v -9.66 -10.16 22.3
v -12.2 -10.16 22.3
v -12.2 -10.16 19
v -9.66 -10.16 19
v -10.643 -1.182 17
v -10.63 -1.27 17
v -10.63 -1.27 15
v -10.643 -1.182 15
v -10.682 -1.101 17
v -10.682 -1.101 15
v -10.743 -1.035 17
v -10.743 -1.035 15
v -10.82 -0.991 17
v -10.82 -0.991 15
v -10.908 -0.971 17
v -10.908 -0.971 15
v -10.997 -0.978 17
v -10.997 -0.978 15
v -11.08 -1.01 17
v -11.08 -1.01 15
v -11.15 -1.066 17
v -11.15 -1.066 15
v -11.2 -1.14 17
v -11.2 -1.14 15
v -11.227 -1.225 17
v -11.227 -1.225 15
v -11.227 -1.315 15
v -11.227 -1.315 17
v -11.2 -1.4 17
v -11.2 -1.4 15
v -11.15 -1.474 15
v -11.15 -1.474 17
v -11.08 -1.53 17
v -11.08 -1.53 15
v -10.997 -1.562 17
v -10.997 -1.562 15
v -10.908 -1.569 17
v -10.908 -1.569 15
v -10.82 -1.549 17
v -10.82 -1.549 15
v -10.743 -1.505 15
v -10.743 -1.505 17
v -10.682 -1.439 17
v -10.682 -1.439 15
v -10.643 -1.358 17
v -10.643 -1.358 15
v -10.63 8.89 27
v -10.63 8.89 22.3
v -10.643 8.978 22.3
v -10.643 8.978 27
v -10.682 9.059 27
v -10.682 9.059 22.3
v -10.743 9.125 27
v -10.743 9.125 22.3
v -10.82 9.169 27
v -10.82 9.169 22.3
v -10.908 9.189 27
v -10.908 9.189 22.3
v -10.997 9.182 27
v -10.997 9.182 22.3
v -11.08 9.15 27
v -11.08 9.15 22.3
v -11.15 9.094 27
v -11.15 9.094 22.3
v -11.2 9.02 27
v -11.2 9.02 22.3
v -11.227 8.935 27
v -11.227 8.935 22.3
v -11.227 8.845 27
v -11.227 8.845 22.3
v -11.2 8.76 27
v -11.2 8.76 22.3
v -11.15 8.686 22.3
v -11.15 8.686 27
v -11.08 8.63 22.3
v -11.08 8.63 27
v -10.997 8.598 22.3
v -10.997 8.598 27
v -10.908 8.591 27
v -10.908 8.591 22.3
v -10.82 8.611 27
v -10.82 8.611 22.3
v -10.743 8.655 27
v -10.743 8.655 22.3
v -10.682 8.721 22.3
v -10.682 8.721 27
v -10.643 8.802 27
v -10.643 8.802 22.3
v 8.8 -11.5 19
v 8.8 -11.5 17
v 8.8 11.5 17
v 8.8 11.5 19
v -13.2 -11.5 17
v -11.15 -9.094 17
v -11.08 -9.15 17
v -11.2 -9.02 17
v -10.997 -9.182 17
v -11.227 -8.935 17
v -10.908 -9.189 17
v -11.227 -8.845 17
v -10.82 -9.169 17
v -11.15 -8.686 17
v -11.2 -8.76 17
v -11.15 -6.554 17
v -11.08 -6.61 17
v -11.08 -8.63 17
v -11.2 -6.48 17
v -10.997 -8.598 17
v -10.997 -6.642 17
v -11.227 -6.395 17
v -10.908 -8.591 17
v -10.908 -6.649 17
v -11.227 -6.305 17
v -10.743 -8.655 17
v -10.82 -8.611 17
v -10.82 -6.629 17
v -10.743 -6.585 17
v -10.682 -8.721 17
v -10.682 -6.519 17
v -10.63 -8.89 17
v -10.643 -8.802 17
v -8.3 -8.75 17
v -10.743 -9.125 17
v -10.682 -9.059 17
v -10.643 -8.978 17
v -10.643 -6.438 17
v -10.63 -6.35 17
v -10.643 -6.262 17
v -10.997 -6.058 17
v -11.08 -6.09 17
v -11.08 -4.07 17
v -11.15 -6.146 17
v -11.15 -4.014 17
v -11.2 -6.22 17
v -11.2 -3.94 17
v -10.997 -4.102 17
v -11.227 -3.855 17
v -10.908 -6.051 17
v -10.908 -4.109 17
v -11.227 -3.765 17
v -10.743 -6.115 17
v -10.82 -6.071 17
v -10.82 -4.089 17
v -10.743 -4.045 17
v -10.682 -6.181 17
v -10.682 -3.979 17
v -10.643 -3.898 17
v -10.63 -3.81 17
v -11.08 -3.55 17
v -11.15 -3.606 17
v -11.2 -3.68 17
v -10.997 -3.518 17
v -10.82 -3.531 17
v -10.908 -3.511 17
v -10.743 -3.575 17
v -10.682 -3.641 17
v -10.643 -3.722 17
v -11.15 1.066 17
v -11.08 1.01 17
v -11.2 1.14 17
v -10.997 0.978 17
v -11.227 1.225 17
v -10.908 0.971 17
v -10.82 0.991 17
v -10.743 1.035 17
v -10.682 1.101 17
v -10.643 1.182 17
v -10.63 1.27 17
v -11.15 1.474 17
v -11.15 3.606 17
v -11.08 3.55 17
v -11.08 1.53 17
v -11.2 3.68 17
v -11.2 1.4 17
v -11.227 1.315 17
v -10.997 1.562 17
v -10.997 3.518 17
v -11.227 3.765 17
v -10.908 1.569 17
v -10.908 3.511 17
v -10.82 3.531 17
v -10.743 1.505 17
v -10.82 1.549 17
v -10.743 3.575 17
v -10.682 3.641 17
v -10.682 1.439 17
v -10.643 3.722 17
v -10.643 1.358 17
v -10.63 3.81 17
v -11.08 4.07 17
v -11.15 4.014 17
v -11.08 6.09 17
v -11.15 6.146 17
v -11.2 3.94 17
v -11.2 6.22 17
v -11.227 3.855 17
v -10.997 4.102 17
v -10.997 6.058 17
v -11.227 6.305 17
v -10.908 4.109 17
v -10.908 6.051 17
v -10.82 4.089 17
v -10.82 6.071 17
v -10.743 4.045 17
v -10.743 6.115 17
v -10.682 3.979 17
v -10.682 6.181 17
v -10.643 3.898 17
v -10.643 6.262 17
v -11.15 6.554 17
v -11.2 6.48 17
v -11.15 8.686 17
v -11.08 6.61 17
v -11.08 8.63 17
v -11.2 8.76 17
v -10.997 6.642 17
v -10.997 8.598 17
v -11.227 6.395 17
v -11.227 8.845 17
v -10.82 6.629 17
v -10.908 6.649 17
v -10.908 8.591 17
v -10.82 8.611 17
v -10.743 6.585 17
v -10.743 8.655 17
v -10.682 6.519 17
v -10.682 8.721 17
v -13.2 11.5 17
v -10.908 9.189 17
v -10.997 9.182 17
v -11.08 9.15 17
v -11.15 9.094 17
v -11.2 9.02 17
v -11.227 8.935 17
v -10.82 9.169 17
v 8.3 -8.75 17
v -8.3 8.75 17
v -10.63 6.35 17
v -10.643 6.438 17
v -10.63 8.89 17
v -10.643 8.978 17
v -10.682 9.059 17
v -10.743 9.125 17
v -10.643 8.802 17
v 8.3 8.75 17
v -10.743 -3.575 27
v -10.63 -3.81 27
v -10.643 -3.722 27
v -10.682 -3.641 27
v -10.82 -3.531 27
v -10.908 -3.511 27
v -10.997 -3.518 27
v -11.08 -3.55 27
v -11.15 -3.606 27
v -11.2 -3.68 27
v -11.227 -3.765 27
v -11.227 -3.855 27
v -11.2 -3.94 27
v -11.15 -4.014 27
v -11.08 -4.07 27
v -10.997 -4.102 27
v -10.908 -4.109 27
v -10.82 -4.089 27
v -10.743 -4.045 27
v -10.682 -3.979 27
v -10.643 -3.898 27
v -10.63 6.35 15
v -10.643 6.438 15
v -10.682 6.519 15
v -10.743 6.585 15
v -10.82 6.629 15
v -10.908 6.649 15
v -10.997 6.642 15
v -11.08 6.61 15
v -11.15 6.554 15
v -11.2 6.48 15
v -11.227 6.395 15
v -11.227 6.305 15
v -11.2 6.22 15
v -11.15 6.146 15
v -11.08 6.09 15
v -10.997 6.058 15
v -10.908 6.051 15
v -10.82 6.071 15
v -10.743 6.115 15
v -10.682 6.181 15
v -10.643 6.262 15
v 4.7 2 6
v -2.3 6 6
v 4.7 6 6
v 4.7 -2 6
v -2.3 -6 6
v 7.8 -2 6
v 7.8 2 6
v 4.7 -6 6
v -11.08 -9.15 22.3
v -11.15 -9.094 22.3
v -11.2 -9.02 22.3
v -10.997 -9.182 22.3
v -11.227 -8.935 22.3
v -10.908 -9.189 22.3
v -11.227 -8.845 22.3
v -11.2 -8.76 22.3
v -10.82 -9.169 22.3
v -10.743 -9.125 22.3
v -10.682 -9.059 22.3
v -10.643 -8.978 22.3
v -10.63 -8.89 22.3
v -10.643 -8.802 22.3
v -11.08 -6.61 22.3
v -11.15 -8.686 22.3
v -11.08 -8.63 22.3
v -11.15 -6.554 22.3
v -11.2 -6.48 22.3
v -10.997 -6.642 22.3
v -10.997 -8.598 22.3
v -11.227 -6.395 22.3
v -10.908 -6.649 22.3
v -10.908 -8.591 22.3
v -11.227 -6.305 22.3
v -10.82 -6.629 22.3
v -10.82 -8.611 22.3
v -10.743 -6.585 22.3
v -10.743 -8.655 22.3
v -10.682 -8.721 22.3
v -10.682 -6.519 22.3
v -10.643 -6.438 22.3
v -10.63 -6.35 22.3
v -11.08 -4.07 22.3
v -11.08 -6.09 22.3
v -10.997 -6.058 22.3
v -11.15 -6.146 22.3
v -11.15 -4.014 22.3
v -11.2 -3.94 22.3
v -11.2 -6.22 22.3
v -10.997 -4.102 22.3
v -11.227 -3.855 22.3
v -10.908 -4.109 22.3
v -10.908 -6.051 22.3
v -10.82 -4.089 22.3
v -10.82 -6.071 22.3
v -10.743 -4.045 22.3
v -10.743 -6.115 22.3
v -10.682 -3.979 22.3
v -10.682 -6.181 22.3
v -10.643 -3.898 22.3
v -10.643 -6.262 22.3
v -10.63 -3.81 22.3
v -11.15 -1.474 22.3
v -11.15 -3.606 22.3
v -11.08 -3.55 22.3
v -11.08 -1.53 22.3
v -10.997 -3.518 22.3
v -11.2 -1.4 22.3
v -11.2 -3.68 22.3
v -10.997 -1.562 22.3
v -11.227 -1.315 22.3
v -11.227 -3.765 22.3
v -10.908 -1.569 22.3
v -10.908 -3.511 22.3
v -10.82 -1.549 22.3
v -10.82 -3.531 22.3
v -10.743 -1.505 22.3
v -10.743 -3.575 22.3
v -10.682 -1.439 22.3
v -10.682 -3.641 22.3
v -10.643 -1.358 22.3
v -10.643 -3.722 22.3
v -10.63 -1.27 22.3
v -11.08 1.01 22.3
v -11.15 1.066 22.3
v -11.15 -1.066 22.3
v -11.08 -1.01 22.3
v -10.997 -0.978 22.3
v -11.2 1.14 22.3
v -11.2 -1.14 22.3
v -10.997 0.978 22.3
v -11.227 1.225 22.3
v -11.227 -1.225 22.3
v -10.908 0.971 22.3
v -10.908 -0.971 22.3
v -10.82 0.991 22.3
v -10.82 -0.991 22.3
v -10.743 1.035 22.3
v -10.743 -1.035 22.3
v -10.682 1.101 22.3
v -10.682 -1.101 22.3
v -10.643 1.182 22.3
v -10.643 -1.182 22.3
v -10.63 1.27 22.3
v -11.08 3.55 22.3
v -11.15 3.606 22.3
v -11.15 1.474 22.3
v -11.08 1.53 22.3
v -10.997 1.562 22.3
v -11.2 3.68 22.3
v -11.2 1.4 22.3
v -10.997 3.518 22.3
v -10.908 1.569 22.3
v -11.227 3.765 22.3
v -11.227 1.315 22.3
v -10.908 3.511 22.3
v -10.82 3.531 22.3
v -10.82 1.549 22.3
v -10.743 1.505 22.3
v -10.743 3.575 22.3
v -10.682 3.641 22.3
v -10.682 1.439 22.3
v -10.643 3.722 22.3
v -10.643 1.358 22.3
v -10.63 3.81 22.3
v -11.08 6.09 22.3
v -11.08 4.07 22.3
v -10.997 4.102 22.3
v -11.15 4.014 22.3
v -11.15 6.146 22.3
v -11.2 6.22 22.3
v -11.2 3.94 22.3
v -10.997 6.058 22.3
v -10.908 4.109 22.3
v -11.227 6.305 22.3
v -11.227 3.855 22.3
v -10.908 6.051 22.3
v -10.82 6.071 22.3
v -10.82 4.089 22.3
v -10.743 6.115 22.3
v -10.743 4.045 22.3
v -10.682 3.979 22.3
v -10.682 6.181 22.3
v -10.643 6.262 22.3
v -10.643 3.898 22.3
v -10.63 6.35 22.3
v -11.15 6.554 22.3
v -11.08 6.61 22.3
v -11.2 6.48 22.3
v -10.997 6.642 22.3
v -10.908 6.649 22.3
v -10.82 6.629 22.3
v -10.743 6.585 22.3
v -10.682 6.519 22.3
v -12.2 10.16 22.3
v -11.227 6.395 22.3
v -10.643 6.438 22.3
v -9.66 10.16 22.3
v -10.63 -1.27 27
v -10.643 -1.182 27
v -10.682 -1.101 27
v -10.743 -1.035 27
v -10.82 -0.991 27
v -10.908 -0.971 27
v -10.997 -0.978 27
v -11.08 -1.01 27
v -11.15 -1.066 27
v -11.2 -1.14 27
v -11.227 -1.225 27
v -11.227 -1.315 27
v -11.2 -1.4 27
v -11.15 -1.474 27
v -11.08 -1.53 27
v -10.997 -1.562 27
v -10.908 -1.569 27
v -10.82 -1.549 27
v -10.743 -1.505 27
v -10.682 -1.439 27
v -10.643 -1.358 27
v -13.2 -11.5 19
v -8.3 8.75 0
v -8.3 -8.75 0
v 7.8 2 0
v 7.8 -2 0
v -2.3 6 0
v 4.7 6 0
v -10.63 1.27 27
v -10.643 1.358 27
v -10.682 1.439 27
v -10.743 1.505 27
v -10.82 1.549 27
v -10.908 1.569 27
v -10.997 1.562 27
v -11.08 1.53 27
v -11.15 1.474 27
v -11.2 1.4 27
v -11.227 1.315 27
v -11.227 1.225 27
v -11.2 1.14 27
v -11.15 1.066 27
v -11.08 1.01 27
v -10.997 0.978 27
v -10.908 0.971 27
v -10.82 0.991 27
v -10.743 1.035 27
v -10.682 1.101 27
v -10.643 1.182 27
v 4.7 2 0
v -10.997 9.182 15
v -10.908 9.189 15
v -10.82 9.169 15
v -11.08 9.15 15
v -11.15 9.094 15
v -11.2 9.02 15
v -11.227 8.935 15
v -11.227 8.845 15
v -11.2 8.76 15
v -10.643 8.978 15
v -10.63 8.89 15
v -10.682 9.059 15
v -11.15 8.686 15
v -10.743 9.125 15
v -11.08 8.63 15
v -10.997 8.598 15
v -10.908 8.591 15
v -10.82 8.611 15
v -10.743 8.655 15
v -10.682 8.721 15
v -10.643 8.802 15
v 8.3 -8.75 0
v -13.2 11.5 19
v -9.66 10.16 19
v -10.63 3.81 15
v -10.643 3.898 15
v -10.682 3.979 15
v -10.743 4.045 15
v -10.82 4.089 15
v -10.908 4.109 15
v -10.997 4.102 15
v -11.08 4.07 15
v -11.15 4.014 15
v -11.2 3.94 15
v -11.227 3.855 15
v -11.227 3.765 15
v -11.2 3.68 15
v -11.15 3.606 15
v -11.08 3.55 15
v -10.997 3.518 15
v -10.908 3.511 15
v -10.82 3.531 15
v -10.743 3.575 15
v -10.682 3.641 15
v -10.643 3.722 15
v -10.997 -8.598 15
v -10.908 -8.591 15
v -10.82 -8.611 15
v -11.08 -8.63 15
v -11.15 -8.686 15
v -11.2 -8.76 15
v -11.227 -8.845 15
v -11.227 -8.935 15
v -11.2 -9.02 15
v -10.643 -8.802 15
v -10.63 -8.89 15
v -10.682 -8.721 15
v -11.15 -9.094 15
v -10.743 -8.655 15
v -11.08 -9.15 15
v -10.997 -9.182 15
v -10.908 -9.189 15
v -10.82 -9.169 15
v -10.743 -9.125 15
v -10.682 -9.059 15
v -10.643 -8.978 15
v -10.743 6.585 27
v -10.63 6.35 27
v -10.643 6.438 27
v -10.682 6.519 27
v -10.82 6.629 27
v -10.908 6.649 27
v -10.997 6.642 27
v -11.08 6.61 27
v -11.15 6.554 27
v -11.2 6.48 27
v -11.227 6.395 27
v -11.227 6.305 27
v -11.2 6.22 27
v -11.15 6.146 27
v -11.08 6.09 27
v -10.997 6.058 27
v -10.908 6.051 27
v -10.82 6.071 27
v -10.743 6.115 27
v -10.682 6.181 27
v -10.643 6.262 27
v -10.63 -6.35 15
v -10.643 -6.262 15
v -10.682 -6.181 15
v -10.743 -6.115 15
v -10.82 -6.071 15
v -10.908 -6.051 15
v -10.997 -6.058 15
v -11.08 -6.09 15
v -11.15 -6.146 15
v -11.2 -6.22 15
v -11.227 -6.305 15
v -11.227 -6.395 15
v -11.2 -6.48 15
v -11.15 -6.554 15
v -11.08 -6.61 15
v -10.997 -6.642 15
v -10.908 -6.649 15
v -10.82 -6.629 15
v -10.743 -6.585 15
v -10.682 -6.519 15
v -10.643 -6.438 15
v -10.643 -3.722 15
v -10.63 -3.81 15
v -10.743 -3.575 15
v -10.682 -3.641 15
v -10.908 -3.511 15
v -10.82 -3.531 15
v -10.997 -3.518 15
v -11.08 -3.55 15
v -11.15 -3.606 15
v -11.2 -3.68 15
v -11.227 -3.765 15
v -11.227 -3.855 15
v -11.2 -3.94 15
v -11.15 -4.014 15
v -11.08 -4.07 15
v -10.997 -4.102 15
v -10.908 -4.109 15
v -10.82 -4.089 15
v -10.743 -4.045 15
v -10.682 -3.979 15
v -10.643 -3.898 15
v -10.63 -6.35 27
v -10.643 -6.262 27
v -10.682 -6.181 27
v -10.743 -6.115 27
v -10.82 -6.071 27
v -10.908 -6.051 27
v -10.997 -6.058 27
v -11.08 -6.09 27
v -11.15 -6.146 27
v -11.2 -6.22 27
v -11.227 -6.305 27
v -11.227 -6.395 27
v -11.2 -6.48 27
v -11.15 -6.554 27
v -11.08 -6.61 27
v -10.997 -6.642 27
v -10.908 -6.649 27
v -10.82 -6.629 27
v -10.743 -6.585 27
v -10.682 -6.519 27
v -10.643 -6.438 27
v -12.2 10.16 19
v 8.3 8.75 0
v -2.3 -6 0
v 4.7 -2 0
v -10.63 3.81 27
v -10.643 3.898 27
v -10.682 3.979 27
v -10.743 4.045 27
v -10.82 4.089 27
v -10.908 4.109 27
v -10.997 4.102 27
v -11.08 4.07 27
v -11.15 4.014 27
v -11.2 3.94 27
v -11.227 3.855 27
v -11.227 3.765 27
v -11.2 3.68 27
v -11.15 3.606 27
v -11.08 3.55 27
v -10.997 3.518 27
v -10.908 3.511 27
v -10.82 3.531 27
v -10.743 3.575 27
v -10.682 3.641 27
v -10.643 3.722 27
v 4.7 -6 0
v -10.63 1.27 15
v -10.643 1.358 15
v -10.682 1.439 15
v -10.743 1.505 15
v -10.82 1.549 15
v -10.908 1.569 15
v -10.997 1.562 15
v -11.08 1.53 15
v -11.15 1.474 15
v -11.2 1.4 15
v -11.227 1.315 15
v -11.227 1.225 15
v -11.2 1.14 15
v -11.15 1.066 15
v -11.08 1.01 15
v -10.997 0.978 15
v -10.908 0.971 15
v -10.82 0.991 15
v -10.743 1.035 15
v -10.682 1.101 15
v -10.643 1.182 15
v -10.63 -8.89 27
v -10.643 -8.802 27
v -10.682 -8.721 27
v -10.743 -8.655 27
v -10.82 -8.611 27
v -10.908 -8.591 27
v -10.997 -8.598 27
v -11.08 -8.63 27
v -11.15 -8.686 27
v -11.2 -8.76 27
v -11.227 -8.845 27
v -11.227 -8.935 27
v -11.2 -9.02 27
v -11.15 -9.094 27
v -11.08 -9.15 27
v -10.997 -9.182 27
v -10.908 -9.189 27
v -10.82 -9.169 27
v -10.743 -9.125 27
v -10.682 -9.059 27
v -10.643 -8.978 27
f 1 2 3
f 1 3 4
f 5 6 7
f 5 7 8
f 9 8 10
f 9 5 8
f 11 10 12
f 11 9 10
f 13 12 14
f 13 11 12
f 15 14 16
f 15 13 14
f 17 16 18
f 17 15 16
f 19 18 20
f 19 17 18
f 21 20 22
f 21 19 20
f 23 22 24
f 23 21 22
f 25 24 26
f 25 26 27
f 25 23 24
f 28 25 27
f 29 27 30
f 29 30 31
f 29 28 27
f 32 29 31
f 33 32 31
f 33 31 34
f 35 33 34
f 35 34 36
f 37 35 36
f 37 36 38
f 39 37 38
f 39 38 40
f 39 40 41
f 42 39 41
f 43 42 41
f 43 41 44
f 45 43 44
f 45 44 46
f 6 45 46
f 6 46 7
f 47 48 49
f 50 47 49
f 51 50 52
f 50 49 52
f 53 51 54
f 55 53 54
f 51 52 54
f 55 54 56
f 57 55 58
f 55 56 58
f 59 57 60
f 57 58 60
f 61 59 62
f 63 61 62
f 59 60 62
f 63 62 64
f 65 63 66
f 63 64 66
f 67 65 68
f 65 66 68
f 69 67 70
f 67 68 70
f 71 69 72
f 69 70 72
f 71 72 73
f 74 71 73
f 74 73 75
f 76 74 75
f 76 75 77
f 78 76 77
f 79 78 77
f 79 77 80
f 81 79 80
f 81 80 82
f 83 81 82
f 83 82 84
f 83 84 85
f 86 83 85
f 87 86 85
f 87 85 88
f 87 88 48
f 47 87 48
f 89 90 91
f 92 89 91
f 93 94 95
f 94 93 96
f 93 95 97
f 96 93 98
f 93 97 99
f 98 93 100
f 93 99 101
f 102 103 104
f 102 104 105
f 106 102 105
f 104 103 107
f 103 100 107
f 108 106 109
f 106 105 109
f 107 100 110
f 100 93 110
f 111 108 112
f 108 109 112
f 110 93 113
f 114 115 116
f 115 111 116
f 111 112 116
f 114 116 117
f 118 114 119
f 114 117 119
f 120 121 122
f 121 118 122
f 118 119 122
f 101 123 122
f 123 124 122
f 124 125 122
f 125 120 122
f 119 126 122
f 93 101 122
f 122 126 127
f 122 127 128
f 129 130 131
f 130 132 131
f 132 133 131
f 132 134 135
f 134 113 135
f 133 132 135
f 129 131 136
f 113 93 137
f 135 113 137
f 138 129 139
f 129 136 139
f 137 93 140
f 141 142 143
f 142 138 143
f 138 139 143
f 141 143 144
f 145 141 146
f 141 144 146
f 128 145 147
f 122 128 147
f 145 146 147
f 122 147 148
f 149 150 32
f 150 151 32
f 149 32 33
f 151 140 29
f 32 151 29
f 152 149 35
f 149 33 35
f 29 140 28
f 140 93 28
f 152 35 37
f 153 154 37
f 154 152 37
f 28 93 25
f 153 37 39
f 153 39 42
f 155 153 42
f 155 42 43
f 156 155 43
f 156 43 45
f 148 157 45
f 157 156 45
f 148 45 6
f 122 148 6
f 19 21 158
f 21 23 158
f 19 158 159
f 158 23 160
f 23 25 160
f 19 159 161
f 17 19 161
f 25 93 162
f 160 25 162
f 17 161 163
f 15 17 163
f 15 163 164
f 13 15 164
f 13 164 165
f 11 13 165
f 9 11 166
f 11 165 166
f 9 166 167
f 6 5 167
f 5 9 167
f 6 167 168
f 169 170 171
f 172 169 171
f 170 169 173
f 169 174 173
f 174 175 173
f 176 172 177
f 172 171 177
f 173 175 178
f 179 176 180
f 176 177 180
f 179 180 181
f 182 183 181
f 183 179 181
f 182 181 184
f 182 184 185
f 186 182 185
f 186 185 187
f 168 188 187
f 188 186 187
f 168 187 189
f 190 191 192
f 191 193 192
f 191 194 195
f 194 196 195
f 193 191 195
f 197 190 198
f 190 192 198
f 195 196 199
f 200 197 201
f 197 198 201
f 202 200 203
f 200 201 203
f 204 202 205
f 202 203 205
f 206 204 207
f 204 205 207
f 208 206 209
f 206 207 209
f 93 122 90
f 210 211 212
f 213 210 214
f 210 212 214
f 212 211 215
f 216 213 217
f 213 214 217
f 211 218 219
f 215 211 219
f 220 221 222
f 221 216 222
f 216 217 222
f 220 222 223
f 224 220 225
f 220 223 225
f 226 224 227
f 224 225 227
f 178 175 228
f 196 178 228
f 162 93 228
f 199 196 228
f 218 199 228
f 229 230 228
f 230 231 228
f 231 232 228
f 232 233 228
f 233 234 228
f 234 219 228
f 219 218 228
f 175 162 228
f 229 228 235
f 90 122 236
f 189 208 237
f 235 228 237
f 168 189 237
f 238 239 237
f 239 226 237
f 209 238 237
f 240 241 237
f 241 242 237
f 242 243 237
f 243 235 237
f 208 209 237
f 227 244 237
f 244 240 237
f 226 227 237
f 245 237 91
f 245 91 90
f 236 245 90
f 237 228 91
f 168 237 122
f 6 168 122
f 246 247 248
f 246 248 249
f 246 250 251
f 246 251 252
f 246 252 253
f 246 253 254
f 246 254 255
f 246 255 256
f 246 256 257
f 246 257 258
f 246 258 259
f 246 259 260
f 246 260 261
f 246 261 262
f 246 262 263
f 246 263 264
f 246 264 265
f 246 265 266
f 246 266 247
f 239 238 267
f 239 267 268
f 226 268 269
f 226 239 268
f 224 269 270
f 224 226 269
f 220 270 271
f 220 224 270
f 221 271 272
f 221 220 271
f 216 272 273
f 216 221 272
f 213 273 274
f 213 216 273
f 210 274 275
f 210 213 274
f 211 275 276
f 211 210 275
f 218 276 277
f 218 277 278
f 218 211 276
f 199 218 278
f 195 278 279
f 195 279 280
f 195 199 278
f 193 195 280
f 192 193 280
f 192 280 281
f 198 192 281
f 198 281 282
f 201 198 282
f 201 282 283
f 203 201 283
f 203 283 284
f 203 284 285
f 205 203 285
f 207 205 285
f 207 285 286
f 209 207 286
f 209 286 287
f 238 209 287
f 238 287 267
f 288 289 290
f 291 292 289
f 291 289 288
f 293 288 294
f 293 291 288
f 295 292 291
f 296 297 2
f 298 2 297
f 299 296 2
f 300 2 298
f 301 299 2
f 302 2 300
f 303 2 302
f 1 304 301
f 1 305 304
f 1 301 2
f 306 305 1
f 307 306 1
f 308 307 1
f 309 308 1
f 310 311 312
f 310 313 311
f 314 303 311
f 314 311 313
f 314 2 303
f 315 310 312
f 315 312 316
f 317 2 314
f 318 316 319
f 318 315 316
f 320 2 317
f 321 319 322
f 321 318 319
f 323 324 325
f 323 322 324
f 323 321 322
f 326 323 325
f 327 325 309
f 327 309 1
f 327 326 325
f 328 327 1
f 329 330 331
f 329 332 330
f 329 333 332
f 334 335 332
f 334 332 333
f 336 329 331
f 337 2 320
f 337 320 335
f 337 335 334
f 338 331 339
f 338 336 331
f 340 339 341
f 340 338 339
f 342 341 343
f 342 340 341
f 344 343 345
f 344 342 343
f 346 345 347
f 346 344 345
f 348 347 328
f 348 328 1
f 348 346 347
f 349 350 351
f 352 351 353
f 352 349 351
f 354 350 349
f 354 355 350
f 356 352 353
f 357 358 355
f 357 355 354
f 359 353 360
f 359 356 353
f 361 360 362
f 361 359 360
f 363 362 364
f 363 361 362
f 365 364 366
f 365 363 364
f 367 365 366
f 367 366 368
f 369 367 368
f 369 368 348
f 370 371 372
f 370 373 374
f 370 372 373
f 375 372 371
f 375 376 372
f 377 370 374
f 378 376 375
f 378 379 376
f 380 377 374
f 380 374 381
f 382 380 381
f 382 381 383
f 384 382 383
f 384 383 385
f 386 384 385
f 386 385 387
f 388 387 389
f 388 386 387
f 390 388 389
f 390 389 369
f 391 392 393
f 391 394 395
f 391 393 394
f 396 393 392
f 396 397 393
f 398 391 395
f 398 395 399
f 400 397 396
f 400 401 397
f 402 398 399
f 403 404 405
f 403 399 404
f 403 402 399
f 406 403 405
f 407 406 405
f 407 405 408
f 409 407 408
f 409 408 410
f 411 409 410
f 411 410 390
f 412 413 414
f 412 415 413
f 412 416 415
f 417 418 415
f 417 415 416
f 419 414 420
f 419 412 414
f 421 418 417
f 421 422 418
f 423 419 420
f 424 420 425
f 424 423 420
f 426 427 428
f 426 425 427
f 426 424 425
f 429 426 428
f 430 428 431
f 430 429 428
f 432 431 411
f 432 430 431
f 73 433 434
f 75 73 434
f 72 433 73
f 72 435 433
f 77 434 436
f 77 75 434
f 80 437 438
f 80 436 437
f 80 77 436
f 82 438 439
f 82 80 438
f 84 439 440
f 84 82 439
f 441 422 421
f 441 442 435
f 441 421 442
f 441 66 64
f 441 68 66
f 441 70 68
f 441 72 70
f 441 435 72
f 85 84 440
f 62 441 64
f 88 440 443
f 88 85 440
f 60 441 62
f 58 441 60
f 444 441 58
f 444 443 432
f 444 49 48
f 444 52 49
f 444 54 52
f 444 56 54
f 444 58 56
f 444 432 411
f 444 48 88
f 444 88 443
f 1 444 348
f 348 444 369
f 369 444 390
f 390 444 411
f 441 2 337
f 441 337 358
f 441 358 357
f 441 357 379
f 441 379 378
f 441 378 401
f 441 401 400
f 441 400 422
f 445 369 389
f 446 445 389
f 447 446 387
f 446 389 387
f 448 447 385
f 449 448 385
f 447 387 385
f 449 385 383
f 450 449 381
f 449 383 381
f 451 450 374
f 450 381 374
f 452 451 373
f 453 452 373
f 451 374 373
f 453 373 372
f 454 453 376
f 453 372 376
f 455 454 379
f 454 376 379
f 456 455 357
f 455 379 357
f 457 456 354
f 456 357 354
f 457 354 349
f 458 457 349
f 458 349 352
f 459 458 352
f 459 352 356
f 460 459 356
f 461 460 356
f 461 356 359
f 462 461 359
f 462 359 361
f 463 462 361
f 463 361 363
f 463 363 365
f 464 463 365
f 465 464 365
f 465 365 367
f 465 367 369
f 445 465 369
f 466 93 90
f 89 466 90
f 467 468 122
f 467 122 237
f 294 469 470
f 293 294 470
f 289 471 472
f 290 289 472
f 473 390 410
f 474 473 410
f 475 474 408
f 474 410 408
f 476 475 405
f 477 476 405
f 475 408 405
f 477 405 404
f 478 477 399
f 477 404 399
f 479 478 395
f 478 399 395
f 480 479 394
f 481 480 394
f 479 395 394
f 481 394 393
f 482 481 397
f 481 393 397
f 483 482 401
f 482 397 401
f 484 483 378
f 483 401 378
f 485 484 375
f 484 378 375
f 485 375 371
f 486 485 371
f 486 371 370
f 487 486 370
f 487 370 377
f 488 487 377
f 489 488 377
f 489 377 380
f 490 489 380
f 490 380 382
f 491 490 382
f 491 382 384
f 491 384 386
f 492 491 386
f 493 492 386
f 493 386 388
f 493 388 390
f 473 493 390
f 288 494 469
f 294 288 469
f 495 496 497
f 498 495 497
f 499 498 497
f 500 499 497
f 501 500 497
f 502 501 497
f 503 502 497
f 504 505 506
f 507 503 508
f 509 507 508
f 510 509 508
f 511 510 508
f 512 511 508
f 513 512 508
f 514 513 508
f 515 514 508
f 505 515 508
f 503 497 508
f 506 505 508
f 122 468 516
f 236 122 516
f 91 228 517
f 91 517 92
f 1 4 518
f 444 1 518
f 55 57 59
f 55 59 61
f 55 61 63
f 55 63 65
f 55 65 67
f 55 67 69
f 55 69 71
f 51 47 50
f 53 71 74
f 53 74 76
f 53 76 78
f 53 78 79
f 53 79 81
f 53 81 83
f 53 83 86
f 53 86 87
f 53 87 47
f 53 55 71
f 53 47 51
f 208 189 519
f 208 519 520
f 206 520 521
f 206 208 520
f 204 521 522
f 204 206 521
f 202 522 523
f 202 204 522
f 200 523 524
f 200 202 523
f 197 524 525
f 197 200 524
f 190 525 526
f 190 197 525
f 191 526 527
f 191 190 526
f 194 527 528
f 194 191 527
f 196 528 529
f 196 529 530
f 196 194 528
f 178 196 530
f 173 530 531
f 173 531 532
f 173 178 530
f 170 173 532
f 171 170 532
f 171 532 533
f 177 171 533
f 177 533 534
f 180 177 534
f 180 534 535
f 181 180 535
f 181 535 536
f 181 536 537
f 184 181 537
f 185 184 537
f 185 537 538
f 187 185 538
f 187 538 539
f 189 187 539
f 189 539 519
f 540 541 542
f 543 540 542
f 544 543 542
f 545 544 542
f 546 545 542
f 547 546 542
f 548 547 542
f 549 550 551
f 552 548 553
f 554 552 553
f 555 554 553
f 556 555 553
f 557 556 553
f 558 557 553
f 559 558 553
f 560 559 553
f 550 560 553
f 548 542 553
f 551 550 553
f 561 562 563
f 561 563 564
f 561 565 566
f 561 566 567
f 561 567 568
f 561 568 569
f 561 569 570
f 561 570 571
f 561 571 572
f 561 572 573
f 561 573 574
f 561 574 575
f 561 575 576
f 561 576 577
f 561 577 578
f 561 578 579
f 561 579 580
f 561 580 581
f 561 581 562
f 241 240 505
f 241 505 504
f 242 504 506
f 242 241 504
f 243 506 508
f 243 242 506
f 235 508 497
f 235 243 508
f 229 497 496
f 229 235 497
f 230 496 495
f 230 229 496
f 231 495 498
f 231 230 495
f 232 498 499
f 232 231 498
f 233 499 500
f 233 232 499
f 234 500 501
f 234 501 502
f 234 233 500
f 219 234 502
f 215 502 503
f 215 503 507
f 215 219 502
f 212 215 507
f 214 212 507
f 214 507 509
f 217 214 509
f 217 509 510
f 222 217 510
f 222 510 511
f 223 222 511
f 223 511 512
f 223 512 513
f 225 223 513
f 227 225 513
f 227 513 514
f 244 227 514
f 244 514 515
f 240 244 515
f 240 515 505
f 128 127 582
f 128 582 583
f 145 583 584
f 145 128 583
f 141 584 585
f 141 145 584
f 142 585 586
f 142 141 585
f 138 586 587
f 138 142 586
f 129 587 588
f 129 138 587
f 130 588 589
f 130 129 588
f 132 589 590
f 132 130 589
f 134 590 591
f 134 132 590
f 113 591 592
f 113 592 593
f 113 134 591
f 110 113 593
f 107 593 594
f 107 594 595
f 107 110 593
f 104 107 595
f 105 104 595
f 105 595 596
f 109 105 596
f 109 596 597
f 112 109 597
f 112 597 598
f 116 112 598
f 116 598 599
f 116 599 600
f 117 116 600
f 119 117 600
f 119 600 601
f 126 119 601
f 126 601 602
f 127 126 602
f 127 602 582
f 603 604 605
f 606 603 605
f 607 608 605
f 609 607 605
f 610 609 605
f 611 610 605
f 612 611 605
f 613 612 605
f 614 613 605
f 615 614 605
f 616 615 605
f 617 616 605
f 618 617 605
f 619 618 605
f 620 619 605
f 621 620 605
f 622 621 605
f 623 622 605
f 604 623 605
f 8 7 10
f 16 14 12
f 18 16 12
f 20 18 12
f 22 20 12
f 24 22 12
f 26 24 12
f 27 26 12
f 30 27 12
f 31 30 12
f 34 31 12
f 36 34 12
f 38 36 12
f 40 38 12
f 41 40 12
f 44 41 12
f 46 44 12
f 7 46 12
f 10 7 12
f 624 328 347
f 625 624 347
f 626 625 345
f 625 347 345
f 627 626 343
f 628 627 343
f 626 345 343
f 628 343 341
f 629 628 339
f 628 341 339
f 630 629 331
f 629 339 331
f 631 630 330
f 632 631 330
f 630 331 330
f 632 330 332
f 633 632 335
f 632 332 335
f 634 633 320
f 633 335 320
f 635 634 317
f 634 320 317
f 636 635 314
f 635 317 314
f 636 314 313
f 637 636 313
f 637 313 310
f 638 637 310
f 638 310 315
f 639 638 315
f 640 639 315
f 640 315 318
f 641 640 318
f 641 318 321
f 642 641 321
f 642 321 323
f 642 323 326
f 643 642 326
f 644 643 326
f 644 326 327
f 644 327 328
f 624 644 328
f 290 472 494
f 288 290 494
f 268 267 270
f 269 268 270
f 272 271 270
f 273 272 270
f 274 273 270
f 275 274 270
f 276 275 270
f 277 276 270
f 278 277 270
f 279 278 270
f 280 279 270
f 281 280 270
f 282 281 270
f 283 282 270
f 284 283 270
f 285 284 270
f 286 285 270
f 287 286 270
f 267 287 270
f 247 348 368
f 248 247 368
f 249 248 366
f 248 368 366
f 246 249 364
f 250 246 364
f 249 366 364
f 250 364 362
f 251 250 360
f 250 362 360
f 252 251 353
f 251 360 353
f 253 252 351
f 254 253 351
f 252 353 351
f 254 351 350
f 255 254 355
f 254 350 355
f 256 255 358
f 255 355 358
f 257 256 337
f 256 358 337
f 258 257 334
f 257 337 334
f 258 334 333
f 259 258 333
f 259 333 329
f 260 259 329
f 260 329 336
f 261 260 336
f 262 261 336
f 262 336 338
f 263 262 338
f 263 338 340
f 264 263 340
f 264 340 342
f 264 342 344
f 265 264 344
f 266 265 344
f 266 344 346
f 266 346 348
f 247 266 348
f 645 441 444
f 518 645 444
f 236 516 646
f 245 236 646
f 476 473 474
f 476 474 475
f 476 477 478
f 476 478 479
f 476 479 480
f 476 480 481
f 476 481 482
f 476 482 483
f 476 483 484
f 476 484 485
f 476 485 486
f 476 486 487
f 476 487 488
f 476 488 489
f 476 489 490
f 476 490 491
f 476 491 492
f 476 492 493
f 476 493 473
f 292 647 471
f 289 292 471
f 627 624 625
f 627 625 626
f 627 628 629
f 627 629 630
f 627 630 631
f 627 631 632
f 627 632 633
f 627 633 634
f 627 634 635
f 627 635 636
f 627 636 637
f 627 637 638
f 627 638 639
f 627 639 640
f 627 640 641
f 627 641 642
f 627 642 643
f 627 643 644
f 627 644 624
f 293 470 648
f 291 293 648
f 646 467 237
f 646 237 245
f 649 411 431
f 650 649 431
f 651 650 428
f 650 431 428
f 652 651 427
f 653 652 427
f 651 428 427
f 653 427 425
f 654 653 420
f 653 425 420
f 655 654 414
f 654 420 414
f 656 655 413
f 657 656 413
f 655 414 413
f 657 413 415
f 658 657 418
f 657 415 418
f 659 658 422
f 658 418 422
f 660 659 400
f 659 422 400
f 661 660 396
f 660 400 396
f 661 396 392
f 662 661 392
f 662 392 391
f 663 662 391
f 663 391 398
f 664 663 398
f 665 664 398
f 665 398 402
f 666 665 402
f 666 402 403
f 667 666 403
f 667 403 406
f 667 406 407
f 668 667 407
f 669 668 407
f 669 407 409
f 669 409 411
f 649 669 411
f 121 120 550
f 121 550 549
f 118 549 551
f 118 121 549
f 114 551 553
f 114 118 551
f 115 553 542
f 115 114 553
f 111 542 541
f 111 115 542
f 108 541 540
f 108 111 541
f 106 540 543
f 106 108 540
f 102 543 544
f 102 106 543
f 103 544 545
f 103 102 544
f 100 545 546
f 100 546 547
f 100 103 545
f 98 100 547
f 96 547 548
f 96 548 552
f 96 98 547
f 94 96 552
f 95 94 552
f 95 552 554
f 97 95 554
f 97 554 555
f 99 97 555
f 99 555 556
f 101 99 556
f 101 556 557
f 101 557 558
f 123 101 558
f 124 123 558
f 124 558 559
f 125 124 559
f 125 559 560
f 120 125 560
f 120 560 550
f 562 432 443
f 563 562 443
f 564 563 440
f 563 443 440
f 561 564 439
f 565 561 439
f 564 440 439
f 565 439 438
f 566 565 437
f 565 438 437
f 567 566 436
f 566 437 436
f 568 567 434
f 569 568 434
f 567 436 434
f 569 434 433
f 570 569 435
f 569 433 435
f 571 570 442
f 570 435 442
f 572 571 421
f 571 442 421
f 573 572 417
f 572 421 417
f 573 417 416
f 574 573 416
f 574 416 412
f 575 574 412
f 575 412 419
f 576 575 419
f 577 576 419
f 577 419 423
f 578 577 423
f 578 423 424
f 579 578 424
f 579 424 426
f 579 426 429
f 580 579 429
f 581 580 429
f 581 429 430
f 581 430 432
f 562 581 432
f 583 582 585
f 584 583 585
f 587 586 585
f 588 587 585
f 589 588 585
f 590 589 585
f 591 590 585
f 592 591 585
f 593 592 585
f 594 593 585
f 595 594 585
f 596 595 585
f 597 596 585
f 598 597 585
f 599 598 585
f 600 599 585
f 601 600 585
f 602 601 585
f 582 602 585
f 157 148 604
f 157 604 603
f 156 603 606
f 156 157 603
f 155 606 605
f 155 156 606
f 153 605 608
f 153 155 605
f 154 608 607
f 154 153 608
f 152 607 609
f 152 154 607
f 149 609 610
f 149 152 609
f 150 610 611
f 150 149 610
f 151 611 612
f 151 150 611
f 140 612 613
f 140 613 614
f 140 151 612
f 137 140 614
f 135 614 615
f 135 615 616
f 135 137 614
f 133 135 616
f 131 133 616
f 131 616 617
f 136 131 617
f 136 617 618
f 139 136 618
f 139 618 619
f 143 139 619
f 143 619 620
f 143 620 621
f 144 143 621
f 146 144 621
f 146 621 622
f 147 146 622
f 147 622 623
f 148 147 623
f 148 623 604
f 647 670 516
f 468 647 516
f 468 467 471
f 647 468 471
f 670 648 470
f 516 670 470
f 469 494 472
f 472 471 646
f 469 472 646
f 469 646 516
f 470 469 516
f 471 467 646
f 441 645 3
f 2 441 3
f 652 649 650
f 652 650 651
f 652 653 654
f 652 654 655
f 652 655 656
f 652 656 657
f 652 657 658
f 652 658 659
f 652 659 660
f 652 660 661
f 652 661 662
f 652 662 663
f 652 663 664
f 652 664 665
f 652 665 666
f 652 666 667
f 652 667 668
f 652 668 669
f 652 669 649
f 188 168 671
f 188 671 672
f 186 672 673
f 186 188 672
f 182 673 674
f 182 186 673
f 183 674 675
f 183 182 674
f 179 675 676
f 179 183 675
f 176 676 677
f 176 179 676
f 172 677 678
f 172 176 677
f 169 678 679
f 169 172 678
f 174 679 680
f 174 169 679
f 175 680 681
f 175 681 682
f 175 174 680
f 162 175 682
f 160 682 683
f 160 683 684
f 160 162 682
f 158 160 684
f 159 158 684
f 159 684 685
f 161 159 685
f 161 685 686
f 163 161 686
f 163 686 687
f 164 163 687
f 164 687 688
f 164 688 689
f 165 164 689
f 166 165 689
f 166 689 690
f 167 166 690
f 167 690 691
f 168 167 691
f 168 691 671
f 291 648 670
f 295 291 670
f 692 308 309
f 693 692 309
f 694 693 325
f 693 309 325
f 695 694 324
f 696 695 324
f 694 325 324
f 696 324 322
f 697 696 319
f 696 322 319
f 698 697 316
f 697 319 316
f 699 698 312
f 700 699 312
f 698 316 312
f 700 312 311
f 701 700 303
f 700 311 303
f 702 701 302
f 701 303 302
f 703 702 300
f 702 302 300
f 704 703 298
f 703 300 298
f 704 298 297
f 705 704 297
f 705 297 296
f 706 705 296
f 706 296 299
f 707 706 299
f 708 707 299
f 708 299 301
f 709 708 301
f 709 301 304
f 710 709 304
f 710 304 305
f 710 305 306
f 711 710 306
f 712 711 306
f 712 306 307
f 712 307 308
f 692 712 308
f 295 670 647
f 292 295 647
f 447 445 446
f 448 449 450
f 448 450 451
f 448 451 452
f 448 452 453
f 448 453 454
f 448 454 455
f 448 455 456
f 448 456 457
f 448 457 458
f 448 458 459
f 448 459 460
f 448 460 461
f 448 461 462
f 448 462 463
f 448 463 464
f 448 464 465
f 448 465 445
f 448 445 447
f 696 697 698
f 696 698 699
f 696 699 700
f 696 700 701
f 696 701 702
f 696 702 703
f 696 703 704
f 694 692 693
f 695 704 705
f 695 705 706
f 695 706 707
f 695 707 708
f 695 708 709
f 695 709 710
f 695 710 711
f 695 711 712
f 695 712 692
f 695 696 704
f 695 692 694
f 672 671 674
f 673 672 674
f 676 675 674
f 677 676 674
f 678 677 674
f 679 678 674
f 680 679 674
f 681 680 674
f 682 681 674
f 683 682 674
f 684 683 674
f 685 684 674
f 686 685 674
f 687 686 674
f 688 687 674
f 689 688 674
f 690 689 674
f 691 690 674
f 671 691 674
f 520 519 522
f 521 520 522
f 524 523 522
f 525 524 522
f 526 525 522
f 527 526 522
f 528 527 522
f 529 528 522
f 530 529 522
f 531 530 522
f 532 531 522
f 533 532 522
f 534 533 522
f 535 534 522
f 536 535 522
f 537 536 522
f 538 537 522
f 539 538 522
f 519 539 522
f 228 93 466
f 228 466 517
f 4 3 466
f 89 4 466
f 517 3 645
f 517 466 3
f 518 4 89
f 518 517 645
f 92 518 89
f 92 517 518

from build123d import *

# Parameters (mm, degrees)
F0_W          = 16.6
F0_H          = 17.5
F1_DEPTH      = 17
F3_DEPTH      = 6
F4_W          = 22
F4_H          = 23
F4_W_2        = 16.6
F4_H_2        = 17.5
F5_DEPTH      = 2
F6_W          = 2.54
F6_H          = 2.54
F6_R          = 0.3
F7_DEPTH      = 3.3
F8_DEPTH      = 8
F8_DEPTH_BACK = 4


with BuildPart() as f1:
    # F0 (on Top) → F1 (new body)
    with BuildSketch(Plane.XY):
        Rectangle(F0_W, F0_H)
    extrude(amount=F1_DEPTH)

    # F2 (on face) → F3 (cut)
    with BuildSketch(Plane(origin=(0, 0, 0), x_dir=(1, 0, 0), z_dir=(0, 0, -1))):
        Polygon((7.8, -2), (7.8, 0), (7.8, 2), (4.7, 2), (4.7, 6), (-2.3, 6), (-2.3, 0), (-2.3, -6), (4.7, -6), (4.7, -2), align=None)
    extrude(amount=-F3_DEPTH, mode=Mode.SUBTRACT)

    # F4 (on face) → F5 (join)
    with BuildSketch(Plane.XY.offset(17)):
        with Locations((-2.2, 0)):
            Rectangle(F4_W, F4_H)
        Rectangle(F4_W_2, F4_H_2, mode=Mode.SUBTRACT)
        Rectangle(F4_W_2, F4_H_2)
    extrude(amount=F5_DEPTH)

    # F6 (on face) → F7 (join)
    with BuildSketch(Plane.XY.offset(19)):
        with Locations((-10.93, -8.89)):
            Rectangle(F6_W, F6_H)
        with Locations((-10.93, -8.89)):
            Circle(F6_R, mode=Mode.SUBTRACT)
        with Locations((-10.93, -6.35)):
            Rectangle(F6_W, F6_H)
        with Locations((-10.93, -6.35)):
            Circle(F6_R, mode=Mode.SUBTRACT)
        with Locations((-10.93, -3.81)):
            Rectangle(F6_W, F6_H)
        with Locations((-10.93, -3.81)):
            Circle(F6_R, mode=Mode.SUBTRACT)
        with Locations((-10.93, -1.27)):
            Rectangle(F6_W, F6_H)
        with Locations((-10.93, -1.27)):
            Circle(F6_R, mode=Mode.SUBTRACT)
        with Locations((-10.93, 1.27)):
            Rectangle(F6_W, F6_H)
        with Locations((-10.93, 1.27)):
            Circle(F6_R, mode=Mode.SUBTRACT)
        with Locations((-10.93, 8.89)):
            Rectangle(F6_W, F6_H)
        with Locations((-10.93, 8.89)):
            Circle(F6_R, mode=Mode.SUBTRACT)
        with Locations((-10.93, 3.81)):
            Rectangle(F6_W, F6_H)
        with Locations((-10.93, 3.81)):
            Circle(F6_R, mode=Mode.SUBTRACT)
        with Locations((-10.93, 6.35)):
            Rectangle(F6_W, F6_H)
        with Locations((-10.93, 6.35)):
            Circle(F6_R, mode=Mode.SUBTRACT)
    extrude(amount=F7_DEPTH)

    # F6 (on face) → F8 (join, two sides)
    with BuildSketch(Plane.XY.offset(19)) as f8_sk:
        with Locations((-10.93, -8.89)):
            Circle(F6_R)
        with Locations((-10.93, -6.35)):
            Circle(F6_R)
        with Locations((-10.93, -3.81)):
            Circle(F6_R)
        with Locations((-10.93, -1.27)):
            Circle(F6_R)
        with Locations((-10.93, 1.27)):
            Circle(F6_R)
        with Locations((-10.93, 3.81)):
            Circle(F6_R)
        with Locations((-10.93, 6.35)):
            Circle(F6_R)
        with Locations((-10.93, 8.89)):
            Circle(F6_R)
    extrude(amount=F8_DEPTH)
    extrude(f8_sk.sketch, amount=-F8_DEPTH_BACK)


solid = f1.part
